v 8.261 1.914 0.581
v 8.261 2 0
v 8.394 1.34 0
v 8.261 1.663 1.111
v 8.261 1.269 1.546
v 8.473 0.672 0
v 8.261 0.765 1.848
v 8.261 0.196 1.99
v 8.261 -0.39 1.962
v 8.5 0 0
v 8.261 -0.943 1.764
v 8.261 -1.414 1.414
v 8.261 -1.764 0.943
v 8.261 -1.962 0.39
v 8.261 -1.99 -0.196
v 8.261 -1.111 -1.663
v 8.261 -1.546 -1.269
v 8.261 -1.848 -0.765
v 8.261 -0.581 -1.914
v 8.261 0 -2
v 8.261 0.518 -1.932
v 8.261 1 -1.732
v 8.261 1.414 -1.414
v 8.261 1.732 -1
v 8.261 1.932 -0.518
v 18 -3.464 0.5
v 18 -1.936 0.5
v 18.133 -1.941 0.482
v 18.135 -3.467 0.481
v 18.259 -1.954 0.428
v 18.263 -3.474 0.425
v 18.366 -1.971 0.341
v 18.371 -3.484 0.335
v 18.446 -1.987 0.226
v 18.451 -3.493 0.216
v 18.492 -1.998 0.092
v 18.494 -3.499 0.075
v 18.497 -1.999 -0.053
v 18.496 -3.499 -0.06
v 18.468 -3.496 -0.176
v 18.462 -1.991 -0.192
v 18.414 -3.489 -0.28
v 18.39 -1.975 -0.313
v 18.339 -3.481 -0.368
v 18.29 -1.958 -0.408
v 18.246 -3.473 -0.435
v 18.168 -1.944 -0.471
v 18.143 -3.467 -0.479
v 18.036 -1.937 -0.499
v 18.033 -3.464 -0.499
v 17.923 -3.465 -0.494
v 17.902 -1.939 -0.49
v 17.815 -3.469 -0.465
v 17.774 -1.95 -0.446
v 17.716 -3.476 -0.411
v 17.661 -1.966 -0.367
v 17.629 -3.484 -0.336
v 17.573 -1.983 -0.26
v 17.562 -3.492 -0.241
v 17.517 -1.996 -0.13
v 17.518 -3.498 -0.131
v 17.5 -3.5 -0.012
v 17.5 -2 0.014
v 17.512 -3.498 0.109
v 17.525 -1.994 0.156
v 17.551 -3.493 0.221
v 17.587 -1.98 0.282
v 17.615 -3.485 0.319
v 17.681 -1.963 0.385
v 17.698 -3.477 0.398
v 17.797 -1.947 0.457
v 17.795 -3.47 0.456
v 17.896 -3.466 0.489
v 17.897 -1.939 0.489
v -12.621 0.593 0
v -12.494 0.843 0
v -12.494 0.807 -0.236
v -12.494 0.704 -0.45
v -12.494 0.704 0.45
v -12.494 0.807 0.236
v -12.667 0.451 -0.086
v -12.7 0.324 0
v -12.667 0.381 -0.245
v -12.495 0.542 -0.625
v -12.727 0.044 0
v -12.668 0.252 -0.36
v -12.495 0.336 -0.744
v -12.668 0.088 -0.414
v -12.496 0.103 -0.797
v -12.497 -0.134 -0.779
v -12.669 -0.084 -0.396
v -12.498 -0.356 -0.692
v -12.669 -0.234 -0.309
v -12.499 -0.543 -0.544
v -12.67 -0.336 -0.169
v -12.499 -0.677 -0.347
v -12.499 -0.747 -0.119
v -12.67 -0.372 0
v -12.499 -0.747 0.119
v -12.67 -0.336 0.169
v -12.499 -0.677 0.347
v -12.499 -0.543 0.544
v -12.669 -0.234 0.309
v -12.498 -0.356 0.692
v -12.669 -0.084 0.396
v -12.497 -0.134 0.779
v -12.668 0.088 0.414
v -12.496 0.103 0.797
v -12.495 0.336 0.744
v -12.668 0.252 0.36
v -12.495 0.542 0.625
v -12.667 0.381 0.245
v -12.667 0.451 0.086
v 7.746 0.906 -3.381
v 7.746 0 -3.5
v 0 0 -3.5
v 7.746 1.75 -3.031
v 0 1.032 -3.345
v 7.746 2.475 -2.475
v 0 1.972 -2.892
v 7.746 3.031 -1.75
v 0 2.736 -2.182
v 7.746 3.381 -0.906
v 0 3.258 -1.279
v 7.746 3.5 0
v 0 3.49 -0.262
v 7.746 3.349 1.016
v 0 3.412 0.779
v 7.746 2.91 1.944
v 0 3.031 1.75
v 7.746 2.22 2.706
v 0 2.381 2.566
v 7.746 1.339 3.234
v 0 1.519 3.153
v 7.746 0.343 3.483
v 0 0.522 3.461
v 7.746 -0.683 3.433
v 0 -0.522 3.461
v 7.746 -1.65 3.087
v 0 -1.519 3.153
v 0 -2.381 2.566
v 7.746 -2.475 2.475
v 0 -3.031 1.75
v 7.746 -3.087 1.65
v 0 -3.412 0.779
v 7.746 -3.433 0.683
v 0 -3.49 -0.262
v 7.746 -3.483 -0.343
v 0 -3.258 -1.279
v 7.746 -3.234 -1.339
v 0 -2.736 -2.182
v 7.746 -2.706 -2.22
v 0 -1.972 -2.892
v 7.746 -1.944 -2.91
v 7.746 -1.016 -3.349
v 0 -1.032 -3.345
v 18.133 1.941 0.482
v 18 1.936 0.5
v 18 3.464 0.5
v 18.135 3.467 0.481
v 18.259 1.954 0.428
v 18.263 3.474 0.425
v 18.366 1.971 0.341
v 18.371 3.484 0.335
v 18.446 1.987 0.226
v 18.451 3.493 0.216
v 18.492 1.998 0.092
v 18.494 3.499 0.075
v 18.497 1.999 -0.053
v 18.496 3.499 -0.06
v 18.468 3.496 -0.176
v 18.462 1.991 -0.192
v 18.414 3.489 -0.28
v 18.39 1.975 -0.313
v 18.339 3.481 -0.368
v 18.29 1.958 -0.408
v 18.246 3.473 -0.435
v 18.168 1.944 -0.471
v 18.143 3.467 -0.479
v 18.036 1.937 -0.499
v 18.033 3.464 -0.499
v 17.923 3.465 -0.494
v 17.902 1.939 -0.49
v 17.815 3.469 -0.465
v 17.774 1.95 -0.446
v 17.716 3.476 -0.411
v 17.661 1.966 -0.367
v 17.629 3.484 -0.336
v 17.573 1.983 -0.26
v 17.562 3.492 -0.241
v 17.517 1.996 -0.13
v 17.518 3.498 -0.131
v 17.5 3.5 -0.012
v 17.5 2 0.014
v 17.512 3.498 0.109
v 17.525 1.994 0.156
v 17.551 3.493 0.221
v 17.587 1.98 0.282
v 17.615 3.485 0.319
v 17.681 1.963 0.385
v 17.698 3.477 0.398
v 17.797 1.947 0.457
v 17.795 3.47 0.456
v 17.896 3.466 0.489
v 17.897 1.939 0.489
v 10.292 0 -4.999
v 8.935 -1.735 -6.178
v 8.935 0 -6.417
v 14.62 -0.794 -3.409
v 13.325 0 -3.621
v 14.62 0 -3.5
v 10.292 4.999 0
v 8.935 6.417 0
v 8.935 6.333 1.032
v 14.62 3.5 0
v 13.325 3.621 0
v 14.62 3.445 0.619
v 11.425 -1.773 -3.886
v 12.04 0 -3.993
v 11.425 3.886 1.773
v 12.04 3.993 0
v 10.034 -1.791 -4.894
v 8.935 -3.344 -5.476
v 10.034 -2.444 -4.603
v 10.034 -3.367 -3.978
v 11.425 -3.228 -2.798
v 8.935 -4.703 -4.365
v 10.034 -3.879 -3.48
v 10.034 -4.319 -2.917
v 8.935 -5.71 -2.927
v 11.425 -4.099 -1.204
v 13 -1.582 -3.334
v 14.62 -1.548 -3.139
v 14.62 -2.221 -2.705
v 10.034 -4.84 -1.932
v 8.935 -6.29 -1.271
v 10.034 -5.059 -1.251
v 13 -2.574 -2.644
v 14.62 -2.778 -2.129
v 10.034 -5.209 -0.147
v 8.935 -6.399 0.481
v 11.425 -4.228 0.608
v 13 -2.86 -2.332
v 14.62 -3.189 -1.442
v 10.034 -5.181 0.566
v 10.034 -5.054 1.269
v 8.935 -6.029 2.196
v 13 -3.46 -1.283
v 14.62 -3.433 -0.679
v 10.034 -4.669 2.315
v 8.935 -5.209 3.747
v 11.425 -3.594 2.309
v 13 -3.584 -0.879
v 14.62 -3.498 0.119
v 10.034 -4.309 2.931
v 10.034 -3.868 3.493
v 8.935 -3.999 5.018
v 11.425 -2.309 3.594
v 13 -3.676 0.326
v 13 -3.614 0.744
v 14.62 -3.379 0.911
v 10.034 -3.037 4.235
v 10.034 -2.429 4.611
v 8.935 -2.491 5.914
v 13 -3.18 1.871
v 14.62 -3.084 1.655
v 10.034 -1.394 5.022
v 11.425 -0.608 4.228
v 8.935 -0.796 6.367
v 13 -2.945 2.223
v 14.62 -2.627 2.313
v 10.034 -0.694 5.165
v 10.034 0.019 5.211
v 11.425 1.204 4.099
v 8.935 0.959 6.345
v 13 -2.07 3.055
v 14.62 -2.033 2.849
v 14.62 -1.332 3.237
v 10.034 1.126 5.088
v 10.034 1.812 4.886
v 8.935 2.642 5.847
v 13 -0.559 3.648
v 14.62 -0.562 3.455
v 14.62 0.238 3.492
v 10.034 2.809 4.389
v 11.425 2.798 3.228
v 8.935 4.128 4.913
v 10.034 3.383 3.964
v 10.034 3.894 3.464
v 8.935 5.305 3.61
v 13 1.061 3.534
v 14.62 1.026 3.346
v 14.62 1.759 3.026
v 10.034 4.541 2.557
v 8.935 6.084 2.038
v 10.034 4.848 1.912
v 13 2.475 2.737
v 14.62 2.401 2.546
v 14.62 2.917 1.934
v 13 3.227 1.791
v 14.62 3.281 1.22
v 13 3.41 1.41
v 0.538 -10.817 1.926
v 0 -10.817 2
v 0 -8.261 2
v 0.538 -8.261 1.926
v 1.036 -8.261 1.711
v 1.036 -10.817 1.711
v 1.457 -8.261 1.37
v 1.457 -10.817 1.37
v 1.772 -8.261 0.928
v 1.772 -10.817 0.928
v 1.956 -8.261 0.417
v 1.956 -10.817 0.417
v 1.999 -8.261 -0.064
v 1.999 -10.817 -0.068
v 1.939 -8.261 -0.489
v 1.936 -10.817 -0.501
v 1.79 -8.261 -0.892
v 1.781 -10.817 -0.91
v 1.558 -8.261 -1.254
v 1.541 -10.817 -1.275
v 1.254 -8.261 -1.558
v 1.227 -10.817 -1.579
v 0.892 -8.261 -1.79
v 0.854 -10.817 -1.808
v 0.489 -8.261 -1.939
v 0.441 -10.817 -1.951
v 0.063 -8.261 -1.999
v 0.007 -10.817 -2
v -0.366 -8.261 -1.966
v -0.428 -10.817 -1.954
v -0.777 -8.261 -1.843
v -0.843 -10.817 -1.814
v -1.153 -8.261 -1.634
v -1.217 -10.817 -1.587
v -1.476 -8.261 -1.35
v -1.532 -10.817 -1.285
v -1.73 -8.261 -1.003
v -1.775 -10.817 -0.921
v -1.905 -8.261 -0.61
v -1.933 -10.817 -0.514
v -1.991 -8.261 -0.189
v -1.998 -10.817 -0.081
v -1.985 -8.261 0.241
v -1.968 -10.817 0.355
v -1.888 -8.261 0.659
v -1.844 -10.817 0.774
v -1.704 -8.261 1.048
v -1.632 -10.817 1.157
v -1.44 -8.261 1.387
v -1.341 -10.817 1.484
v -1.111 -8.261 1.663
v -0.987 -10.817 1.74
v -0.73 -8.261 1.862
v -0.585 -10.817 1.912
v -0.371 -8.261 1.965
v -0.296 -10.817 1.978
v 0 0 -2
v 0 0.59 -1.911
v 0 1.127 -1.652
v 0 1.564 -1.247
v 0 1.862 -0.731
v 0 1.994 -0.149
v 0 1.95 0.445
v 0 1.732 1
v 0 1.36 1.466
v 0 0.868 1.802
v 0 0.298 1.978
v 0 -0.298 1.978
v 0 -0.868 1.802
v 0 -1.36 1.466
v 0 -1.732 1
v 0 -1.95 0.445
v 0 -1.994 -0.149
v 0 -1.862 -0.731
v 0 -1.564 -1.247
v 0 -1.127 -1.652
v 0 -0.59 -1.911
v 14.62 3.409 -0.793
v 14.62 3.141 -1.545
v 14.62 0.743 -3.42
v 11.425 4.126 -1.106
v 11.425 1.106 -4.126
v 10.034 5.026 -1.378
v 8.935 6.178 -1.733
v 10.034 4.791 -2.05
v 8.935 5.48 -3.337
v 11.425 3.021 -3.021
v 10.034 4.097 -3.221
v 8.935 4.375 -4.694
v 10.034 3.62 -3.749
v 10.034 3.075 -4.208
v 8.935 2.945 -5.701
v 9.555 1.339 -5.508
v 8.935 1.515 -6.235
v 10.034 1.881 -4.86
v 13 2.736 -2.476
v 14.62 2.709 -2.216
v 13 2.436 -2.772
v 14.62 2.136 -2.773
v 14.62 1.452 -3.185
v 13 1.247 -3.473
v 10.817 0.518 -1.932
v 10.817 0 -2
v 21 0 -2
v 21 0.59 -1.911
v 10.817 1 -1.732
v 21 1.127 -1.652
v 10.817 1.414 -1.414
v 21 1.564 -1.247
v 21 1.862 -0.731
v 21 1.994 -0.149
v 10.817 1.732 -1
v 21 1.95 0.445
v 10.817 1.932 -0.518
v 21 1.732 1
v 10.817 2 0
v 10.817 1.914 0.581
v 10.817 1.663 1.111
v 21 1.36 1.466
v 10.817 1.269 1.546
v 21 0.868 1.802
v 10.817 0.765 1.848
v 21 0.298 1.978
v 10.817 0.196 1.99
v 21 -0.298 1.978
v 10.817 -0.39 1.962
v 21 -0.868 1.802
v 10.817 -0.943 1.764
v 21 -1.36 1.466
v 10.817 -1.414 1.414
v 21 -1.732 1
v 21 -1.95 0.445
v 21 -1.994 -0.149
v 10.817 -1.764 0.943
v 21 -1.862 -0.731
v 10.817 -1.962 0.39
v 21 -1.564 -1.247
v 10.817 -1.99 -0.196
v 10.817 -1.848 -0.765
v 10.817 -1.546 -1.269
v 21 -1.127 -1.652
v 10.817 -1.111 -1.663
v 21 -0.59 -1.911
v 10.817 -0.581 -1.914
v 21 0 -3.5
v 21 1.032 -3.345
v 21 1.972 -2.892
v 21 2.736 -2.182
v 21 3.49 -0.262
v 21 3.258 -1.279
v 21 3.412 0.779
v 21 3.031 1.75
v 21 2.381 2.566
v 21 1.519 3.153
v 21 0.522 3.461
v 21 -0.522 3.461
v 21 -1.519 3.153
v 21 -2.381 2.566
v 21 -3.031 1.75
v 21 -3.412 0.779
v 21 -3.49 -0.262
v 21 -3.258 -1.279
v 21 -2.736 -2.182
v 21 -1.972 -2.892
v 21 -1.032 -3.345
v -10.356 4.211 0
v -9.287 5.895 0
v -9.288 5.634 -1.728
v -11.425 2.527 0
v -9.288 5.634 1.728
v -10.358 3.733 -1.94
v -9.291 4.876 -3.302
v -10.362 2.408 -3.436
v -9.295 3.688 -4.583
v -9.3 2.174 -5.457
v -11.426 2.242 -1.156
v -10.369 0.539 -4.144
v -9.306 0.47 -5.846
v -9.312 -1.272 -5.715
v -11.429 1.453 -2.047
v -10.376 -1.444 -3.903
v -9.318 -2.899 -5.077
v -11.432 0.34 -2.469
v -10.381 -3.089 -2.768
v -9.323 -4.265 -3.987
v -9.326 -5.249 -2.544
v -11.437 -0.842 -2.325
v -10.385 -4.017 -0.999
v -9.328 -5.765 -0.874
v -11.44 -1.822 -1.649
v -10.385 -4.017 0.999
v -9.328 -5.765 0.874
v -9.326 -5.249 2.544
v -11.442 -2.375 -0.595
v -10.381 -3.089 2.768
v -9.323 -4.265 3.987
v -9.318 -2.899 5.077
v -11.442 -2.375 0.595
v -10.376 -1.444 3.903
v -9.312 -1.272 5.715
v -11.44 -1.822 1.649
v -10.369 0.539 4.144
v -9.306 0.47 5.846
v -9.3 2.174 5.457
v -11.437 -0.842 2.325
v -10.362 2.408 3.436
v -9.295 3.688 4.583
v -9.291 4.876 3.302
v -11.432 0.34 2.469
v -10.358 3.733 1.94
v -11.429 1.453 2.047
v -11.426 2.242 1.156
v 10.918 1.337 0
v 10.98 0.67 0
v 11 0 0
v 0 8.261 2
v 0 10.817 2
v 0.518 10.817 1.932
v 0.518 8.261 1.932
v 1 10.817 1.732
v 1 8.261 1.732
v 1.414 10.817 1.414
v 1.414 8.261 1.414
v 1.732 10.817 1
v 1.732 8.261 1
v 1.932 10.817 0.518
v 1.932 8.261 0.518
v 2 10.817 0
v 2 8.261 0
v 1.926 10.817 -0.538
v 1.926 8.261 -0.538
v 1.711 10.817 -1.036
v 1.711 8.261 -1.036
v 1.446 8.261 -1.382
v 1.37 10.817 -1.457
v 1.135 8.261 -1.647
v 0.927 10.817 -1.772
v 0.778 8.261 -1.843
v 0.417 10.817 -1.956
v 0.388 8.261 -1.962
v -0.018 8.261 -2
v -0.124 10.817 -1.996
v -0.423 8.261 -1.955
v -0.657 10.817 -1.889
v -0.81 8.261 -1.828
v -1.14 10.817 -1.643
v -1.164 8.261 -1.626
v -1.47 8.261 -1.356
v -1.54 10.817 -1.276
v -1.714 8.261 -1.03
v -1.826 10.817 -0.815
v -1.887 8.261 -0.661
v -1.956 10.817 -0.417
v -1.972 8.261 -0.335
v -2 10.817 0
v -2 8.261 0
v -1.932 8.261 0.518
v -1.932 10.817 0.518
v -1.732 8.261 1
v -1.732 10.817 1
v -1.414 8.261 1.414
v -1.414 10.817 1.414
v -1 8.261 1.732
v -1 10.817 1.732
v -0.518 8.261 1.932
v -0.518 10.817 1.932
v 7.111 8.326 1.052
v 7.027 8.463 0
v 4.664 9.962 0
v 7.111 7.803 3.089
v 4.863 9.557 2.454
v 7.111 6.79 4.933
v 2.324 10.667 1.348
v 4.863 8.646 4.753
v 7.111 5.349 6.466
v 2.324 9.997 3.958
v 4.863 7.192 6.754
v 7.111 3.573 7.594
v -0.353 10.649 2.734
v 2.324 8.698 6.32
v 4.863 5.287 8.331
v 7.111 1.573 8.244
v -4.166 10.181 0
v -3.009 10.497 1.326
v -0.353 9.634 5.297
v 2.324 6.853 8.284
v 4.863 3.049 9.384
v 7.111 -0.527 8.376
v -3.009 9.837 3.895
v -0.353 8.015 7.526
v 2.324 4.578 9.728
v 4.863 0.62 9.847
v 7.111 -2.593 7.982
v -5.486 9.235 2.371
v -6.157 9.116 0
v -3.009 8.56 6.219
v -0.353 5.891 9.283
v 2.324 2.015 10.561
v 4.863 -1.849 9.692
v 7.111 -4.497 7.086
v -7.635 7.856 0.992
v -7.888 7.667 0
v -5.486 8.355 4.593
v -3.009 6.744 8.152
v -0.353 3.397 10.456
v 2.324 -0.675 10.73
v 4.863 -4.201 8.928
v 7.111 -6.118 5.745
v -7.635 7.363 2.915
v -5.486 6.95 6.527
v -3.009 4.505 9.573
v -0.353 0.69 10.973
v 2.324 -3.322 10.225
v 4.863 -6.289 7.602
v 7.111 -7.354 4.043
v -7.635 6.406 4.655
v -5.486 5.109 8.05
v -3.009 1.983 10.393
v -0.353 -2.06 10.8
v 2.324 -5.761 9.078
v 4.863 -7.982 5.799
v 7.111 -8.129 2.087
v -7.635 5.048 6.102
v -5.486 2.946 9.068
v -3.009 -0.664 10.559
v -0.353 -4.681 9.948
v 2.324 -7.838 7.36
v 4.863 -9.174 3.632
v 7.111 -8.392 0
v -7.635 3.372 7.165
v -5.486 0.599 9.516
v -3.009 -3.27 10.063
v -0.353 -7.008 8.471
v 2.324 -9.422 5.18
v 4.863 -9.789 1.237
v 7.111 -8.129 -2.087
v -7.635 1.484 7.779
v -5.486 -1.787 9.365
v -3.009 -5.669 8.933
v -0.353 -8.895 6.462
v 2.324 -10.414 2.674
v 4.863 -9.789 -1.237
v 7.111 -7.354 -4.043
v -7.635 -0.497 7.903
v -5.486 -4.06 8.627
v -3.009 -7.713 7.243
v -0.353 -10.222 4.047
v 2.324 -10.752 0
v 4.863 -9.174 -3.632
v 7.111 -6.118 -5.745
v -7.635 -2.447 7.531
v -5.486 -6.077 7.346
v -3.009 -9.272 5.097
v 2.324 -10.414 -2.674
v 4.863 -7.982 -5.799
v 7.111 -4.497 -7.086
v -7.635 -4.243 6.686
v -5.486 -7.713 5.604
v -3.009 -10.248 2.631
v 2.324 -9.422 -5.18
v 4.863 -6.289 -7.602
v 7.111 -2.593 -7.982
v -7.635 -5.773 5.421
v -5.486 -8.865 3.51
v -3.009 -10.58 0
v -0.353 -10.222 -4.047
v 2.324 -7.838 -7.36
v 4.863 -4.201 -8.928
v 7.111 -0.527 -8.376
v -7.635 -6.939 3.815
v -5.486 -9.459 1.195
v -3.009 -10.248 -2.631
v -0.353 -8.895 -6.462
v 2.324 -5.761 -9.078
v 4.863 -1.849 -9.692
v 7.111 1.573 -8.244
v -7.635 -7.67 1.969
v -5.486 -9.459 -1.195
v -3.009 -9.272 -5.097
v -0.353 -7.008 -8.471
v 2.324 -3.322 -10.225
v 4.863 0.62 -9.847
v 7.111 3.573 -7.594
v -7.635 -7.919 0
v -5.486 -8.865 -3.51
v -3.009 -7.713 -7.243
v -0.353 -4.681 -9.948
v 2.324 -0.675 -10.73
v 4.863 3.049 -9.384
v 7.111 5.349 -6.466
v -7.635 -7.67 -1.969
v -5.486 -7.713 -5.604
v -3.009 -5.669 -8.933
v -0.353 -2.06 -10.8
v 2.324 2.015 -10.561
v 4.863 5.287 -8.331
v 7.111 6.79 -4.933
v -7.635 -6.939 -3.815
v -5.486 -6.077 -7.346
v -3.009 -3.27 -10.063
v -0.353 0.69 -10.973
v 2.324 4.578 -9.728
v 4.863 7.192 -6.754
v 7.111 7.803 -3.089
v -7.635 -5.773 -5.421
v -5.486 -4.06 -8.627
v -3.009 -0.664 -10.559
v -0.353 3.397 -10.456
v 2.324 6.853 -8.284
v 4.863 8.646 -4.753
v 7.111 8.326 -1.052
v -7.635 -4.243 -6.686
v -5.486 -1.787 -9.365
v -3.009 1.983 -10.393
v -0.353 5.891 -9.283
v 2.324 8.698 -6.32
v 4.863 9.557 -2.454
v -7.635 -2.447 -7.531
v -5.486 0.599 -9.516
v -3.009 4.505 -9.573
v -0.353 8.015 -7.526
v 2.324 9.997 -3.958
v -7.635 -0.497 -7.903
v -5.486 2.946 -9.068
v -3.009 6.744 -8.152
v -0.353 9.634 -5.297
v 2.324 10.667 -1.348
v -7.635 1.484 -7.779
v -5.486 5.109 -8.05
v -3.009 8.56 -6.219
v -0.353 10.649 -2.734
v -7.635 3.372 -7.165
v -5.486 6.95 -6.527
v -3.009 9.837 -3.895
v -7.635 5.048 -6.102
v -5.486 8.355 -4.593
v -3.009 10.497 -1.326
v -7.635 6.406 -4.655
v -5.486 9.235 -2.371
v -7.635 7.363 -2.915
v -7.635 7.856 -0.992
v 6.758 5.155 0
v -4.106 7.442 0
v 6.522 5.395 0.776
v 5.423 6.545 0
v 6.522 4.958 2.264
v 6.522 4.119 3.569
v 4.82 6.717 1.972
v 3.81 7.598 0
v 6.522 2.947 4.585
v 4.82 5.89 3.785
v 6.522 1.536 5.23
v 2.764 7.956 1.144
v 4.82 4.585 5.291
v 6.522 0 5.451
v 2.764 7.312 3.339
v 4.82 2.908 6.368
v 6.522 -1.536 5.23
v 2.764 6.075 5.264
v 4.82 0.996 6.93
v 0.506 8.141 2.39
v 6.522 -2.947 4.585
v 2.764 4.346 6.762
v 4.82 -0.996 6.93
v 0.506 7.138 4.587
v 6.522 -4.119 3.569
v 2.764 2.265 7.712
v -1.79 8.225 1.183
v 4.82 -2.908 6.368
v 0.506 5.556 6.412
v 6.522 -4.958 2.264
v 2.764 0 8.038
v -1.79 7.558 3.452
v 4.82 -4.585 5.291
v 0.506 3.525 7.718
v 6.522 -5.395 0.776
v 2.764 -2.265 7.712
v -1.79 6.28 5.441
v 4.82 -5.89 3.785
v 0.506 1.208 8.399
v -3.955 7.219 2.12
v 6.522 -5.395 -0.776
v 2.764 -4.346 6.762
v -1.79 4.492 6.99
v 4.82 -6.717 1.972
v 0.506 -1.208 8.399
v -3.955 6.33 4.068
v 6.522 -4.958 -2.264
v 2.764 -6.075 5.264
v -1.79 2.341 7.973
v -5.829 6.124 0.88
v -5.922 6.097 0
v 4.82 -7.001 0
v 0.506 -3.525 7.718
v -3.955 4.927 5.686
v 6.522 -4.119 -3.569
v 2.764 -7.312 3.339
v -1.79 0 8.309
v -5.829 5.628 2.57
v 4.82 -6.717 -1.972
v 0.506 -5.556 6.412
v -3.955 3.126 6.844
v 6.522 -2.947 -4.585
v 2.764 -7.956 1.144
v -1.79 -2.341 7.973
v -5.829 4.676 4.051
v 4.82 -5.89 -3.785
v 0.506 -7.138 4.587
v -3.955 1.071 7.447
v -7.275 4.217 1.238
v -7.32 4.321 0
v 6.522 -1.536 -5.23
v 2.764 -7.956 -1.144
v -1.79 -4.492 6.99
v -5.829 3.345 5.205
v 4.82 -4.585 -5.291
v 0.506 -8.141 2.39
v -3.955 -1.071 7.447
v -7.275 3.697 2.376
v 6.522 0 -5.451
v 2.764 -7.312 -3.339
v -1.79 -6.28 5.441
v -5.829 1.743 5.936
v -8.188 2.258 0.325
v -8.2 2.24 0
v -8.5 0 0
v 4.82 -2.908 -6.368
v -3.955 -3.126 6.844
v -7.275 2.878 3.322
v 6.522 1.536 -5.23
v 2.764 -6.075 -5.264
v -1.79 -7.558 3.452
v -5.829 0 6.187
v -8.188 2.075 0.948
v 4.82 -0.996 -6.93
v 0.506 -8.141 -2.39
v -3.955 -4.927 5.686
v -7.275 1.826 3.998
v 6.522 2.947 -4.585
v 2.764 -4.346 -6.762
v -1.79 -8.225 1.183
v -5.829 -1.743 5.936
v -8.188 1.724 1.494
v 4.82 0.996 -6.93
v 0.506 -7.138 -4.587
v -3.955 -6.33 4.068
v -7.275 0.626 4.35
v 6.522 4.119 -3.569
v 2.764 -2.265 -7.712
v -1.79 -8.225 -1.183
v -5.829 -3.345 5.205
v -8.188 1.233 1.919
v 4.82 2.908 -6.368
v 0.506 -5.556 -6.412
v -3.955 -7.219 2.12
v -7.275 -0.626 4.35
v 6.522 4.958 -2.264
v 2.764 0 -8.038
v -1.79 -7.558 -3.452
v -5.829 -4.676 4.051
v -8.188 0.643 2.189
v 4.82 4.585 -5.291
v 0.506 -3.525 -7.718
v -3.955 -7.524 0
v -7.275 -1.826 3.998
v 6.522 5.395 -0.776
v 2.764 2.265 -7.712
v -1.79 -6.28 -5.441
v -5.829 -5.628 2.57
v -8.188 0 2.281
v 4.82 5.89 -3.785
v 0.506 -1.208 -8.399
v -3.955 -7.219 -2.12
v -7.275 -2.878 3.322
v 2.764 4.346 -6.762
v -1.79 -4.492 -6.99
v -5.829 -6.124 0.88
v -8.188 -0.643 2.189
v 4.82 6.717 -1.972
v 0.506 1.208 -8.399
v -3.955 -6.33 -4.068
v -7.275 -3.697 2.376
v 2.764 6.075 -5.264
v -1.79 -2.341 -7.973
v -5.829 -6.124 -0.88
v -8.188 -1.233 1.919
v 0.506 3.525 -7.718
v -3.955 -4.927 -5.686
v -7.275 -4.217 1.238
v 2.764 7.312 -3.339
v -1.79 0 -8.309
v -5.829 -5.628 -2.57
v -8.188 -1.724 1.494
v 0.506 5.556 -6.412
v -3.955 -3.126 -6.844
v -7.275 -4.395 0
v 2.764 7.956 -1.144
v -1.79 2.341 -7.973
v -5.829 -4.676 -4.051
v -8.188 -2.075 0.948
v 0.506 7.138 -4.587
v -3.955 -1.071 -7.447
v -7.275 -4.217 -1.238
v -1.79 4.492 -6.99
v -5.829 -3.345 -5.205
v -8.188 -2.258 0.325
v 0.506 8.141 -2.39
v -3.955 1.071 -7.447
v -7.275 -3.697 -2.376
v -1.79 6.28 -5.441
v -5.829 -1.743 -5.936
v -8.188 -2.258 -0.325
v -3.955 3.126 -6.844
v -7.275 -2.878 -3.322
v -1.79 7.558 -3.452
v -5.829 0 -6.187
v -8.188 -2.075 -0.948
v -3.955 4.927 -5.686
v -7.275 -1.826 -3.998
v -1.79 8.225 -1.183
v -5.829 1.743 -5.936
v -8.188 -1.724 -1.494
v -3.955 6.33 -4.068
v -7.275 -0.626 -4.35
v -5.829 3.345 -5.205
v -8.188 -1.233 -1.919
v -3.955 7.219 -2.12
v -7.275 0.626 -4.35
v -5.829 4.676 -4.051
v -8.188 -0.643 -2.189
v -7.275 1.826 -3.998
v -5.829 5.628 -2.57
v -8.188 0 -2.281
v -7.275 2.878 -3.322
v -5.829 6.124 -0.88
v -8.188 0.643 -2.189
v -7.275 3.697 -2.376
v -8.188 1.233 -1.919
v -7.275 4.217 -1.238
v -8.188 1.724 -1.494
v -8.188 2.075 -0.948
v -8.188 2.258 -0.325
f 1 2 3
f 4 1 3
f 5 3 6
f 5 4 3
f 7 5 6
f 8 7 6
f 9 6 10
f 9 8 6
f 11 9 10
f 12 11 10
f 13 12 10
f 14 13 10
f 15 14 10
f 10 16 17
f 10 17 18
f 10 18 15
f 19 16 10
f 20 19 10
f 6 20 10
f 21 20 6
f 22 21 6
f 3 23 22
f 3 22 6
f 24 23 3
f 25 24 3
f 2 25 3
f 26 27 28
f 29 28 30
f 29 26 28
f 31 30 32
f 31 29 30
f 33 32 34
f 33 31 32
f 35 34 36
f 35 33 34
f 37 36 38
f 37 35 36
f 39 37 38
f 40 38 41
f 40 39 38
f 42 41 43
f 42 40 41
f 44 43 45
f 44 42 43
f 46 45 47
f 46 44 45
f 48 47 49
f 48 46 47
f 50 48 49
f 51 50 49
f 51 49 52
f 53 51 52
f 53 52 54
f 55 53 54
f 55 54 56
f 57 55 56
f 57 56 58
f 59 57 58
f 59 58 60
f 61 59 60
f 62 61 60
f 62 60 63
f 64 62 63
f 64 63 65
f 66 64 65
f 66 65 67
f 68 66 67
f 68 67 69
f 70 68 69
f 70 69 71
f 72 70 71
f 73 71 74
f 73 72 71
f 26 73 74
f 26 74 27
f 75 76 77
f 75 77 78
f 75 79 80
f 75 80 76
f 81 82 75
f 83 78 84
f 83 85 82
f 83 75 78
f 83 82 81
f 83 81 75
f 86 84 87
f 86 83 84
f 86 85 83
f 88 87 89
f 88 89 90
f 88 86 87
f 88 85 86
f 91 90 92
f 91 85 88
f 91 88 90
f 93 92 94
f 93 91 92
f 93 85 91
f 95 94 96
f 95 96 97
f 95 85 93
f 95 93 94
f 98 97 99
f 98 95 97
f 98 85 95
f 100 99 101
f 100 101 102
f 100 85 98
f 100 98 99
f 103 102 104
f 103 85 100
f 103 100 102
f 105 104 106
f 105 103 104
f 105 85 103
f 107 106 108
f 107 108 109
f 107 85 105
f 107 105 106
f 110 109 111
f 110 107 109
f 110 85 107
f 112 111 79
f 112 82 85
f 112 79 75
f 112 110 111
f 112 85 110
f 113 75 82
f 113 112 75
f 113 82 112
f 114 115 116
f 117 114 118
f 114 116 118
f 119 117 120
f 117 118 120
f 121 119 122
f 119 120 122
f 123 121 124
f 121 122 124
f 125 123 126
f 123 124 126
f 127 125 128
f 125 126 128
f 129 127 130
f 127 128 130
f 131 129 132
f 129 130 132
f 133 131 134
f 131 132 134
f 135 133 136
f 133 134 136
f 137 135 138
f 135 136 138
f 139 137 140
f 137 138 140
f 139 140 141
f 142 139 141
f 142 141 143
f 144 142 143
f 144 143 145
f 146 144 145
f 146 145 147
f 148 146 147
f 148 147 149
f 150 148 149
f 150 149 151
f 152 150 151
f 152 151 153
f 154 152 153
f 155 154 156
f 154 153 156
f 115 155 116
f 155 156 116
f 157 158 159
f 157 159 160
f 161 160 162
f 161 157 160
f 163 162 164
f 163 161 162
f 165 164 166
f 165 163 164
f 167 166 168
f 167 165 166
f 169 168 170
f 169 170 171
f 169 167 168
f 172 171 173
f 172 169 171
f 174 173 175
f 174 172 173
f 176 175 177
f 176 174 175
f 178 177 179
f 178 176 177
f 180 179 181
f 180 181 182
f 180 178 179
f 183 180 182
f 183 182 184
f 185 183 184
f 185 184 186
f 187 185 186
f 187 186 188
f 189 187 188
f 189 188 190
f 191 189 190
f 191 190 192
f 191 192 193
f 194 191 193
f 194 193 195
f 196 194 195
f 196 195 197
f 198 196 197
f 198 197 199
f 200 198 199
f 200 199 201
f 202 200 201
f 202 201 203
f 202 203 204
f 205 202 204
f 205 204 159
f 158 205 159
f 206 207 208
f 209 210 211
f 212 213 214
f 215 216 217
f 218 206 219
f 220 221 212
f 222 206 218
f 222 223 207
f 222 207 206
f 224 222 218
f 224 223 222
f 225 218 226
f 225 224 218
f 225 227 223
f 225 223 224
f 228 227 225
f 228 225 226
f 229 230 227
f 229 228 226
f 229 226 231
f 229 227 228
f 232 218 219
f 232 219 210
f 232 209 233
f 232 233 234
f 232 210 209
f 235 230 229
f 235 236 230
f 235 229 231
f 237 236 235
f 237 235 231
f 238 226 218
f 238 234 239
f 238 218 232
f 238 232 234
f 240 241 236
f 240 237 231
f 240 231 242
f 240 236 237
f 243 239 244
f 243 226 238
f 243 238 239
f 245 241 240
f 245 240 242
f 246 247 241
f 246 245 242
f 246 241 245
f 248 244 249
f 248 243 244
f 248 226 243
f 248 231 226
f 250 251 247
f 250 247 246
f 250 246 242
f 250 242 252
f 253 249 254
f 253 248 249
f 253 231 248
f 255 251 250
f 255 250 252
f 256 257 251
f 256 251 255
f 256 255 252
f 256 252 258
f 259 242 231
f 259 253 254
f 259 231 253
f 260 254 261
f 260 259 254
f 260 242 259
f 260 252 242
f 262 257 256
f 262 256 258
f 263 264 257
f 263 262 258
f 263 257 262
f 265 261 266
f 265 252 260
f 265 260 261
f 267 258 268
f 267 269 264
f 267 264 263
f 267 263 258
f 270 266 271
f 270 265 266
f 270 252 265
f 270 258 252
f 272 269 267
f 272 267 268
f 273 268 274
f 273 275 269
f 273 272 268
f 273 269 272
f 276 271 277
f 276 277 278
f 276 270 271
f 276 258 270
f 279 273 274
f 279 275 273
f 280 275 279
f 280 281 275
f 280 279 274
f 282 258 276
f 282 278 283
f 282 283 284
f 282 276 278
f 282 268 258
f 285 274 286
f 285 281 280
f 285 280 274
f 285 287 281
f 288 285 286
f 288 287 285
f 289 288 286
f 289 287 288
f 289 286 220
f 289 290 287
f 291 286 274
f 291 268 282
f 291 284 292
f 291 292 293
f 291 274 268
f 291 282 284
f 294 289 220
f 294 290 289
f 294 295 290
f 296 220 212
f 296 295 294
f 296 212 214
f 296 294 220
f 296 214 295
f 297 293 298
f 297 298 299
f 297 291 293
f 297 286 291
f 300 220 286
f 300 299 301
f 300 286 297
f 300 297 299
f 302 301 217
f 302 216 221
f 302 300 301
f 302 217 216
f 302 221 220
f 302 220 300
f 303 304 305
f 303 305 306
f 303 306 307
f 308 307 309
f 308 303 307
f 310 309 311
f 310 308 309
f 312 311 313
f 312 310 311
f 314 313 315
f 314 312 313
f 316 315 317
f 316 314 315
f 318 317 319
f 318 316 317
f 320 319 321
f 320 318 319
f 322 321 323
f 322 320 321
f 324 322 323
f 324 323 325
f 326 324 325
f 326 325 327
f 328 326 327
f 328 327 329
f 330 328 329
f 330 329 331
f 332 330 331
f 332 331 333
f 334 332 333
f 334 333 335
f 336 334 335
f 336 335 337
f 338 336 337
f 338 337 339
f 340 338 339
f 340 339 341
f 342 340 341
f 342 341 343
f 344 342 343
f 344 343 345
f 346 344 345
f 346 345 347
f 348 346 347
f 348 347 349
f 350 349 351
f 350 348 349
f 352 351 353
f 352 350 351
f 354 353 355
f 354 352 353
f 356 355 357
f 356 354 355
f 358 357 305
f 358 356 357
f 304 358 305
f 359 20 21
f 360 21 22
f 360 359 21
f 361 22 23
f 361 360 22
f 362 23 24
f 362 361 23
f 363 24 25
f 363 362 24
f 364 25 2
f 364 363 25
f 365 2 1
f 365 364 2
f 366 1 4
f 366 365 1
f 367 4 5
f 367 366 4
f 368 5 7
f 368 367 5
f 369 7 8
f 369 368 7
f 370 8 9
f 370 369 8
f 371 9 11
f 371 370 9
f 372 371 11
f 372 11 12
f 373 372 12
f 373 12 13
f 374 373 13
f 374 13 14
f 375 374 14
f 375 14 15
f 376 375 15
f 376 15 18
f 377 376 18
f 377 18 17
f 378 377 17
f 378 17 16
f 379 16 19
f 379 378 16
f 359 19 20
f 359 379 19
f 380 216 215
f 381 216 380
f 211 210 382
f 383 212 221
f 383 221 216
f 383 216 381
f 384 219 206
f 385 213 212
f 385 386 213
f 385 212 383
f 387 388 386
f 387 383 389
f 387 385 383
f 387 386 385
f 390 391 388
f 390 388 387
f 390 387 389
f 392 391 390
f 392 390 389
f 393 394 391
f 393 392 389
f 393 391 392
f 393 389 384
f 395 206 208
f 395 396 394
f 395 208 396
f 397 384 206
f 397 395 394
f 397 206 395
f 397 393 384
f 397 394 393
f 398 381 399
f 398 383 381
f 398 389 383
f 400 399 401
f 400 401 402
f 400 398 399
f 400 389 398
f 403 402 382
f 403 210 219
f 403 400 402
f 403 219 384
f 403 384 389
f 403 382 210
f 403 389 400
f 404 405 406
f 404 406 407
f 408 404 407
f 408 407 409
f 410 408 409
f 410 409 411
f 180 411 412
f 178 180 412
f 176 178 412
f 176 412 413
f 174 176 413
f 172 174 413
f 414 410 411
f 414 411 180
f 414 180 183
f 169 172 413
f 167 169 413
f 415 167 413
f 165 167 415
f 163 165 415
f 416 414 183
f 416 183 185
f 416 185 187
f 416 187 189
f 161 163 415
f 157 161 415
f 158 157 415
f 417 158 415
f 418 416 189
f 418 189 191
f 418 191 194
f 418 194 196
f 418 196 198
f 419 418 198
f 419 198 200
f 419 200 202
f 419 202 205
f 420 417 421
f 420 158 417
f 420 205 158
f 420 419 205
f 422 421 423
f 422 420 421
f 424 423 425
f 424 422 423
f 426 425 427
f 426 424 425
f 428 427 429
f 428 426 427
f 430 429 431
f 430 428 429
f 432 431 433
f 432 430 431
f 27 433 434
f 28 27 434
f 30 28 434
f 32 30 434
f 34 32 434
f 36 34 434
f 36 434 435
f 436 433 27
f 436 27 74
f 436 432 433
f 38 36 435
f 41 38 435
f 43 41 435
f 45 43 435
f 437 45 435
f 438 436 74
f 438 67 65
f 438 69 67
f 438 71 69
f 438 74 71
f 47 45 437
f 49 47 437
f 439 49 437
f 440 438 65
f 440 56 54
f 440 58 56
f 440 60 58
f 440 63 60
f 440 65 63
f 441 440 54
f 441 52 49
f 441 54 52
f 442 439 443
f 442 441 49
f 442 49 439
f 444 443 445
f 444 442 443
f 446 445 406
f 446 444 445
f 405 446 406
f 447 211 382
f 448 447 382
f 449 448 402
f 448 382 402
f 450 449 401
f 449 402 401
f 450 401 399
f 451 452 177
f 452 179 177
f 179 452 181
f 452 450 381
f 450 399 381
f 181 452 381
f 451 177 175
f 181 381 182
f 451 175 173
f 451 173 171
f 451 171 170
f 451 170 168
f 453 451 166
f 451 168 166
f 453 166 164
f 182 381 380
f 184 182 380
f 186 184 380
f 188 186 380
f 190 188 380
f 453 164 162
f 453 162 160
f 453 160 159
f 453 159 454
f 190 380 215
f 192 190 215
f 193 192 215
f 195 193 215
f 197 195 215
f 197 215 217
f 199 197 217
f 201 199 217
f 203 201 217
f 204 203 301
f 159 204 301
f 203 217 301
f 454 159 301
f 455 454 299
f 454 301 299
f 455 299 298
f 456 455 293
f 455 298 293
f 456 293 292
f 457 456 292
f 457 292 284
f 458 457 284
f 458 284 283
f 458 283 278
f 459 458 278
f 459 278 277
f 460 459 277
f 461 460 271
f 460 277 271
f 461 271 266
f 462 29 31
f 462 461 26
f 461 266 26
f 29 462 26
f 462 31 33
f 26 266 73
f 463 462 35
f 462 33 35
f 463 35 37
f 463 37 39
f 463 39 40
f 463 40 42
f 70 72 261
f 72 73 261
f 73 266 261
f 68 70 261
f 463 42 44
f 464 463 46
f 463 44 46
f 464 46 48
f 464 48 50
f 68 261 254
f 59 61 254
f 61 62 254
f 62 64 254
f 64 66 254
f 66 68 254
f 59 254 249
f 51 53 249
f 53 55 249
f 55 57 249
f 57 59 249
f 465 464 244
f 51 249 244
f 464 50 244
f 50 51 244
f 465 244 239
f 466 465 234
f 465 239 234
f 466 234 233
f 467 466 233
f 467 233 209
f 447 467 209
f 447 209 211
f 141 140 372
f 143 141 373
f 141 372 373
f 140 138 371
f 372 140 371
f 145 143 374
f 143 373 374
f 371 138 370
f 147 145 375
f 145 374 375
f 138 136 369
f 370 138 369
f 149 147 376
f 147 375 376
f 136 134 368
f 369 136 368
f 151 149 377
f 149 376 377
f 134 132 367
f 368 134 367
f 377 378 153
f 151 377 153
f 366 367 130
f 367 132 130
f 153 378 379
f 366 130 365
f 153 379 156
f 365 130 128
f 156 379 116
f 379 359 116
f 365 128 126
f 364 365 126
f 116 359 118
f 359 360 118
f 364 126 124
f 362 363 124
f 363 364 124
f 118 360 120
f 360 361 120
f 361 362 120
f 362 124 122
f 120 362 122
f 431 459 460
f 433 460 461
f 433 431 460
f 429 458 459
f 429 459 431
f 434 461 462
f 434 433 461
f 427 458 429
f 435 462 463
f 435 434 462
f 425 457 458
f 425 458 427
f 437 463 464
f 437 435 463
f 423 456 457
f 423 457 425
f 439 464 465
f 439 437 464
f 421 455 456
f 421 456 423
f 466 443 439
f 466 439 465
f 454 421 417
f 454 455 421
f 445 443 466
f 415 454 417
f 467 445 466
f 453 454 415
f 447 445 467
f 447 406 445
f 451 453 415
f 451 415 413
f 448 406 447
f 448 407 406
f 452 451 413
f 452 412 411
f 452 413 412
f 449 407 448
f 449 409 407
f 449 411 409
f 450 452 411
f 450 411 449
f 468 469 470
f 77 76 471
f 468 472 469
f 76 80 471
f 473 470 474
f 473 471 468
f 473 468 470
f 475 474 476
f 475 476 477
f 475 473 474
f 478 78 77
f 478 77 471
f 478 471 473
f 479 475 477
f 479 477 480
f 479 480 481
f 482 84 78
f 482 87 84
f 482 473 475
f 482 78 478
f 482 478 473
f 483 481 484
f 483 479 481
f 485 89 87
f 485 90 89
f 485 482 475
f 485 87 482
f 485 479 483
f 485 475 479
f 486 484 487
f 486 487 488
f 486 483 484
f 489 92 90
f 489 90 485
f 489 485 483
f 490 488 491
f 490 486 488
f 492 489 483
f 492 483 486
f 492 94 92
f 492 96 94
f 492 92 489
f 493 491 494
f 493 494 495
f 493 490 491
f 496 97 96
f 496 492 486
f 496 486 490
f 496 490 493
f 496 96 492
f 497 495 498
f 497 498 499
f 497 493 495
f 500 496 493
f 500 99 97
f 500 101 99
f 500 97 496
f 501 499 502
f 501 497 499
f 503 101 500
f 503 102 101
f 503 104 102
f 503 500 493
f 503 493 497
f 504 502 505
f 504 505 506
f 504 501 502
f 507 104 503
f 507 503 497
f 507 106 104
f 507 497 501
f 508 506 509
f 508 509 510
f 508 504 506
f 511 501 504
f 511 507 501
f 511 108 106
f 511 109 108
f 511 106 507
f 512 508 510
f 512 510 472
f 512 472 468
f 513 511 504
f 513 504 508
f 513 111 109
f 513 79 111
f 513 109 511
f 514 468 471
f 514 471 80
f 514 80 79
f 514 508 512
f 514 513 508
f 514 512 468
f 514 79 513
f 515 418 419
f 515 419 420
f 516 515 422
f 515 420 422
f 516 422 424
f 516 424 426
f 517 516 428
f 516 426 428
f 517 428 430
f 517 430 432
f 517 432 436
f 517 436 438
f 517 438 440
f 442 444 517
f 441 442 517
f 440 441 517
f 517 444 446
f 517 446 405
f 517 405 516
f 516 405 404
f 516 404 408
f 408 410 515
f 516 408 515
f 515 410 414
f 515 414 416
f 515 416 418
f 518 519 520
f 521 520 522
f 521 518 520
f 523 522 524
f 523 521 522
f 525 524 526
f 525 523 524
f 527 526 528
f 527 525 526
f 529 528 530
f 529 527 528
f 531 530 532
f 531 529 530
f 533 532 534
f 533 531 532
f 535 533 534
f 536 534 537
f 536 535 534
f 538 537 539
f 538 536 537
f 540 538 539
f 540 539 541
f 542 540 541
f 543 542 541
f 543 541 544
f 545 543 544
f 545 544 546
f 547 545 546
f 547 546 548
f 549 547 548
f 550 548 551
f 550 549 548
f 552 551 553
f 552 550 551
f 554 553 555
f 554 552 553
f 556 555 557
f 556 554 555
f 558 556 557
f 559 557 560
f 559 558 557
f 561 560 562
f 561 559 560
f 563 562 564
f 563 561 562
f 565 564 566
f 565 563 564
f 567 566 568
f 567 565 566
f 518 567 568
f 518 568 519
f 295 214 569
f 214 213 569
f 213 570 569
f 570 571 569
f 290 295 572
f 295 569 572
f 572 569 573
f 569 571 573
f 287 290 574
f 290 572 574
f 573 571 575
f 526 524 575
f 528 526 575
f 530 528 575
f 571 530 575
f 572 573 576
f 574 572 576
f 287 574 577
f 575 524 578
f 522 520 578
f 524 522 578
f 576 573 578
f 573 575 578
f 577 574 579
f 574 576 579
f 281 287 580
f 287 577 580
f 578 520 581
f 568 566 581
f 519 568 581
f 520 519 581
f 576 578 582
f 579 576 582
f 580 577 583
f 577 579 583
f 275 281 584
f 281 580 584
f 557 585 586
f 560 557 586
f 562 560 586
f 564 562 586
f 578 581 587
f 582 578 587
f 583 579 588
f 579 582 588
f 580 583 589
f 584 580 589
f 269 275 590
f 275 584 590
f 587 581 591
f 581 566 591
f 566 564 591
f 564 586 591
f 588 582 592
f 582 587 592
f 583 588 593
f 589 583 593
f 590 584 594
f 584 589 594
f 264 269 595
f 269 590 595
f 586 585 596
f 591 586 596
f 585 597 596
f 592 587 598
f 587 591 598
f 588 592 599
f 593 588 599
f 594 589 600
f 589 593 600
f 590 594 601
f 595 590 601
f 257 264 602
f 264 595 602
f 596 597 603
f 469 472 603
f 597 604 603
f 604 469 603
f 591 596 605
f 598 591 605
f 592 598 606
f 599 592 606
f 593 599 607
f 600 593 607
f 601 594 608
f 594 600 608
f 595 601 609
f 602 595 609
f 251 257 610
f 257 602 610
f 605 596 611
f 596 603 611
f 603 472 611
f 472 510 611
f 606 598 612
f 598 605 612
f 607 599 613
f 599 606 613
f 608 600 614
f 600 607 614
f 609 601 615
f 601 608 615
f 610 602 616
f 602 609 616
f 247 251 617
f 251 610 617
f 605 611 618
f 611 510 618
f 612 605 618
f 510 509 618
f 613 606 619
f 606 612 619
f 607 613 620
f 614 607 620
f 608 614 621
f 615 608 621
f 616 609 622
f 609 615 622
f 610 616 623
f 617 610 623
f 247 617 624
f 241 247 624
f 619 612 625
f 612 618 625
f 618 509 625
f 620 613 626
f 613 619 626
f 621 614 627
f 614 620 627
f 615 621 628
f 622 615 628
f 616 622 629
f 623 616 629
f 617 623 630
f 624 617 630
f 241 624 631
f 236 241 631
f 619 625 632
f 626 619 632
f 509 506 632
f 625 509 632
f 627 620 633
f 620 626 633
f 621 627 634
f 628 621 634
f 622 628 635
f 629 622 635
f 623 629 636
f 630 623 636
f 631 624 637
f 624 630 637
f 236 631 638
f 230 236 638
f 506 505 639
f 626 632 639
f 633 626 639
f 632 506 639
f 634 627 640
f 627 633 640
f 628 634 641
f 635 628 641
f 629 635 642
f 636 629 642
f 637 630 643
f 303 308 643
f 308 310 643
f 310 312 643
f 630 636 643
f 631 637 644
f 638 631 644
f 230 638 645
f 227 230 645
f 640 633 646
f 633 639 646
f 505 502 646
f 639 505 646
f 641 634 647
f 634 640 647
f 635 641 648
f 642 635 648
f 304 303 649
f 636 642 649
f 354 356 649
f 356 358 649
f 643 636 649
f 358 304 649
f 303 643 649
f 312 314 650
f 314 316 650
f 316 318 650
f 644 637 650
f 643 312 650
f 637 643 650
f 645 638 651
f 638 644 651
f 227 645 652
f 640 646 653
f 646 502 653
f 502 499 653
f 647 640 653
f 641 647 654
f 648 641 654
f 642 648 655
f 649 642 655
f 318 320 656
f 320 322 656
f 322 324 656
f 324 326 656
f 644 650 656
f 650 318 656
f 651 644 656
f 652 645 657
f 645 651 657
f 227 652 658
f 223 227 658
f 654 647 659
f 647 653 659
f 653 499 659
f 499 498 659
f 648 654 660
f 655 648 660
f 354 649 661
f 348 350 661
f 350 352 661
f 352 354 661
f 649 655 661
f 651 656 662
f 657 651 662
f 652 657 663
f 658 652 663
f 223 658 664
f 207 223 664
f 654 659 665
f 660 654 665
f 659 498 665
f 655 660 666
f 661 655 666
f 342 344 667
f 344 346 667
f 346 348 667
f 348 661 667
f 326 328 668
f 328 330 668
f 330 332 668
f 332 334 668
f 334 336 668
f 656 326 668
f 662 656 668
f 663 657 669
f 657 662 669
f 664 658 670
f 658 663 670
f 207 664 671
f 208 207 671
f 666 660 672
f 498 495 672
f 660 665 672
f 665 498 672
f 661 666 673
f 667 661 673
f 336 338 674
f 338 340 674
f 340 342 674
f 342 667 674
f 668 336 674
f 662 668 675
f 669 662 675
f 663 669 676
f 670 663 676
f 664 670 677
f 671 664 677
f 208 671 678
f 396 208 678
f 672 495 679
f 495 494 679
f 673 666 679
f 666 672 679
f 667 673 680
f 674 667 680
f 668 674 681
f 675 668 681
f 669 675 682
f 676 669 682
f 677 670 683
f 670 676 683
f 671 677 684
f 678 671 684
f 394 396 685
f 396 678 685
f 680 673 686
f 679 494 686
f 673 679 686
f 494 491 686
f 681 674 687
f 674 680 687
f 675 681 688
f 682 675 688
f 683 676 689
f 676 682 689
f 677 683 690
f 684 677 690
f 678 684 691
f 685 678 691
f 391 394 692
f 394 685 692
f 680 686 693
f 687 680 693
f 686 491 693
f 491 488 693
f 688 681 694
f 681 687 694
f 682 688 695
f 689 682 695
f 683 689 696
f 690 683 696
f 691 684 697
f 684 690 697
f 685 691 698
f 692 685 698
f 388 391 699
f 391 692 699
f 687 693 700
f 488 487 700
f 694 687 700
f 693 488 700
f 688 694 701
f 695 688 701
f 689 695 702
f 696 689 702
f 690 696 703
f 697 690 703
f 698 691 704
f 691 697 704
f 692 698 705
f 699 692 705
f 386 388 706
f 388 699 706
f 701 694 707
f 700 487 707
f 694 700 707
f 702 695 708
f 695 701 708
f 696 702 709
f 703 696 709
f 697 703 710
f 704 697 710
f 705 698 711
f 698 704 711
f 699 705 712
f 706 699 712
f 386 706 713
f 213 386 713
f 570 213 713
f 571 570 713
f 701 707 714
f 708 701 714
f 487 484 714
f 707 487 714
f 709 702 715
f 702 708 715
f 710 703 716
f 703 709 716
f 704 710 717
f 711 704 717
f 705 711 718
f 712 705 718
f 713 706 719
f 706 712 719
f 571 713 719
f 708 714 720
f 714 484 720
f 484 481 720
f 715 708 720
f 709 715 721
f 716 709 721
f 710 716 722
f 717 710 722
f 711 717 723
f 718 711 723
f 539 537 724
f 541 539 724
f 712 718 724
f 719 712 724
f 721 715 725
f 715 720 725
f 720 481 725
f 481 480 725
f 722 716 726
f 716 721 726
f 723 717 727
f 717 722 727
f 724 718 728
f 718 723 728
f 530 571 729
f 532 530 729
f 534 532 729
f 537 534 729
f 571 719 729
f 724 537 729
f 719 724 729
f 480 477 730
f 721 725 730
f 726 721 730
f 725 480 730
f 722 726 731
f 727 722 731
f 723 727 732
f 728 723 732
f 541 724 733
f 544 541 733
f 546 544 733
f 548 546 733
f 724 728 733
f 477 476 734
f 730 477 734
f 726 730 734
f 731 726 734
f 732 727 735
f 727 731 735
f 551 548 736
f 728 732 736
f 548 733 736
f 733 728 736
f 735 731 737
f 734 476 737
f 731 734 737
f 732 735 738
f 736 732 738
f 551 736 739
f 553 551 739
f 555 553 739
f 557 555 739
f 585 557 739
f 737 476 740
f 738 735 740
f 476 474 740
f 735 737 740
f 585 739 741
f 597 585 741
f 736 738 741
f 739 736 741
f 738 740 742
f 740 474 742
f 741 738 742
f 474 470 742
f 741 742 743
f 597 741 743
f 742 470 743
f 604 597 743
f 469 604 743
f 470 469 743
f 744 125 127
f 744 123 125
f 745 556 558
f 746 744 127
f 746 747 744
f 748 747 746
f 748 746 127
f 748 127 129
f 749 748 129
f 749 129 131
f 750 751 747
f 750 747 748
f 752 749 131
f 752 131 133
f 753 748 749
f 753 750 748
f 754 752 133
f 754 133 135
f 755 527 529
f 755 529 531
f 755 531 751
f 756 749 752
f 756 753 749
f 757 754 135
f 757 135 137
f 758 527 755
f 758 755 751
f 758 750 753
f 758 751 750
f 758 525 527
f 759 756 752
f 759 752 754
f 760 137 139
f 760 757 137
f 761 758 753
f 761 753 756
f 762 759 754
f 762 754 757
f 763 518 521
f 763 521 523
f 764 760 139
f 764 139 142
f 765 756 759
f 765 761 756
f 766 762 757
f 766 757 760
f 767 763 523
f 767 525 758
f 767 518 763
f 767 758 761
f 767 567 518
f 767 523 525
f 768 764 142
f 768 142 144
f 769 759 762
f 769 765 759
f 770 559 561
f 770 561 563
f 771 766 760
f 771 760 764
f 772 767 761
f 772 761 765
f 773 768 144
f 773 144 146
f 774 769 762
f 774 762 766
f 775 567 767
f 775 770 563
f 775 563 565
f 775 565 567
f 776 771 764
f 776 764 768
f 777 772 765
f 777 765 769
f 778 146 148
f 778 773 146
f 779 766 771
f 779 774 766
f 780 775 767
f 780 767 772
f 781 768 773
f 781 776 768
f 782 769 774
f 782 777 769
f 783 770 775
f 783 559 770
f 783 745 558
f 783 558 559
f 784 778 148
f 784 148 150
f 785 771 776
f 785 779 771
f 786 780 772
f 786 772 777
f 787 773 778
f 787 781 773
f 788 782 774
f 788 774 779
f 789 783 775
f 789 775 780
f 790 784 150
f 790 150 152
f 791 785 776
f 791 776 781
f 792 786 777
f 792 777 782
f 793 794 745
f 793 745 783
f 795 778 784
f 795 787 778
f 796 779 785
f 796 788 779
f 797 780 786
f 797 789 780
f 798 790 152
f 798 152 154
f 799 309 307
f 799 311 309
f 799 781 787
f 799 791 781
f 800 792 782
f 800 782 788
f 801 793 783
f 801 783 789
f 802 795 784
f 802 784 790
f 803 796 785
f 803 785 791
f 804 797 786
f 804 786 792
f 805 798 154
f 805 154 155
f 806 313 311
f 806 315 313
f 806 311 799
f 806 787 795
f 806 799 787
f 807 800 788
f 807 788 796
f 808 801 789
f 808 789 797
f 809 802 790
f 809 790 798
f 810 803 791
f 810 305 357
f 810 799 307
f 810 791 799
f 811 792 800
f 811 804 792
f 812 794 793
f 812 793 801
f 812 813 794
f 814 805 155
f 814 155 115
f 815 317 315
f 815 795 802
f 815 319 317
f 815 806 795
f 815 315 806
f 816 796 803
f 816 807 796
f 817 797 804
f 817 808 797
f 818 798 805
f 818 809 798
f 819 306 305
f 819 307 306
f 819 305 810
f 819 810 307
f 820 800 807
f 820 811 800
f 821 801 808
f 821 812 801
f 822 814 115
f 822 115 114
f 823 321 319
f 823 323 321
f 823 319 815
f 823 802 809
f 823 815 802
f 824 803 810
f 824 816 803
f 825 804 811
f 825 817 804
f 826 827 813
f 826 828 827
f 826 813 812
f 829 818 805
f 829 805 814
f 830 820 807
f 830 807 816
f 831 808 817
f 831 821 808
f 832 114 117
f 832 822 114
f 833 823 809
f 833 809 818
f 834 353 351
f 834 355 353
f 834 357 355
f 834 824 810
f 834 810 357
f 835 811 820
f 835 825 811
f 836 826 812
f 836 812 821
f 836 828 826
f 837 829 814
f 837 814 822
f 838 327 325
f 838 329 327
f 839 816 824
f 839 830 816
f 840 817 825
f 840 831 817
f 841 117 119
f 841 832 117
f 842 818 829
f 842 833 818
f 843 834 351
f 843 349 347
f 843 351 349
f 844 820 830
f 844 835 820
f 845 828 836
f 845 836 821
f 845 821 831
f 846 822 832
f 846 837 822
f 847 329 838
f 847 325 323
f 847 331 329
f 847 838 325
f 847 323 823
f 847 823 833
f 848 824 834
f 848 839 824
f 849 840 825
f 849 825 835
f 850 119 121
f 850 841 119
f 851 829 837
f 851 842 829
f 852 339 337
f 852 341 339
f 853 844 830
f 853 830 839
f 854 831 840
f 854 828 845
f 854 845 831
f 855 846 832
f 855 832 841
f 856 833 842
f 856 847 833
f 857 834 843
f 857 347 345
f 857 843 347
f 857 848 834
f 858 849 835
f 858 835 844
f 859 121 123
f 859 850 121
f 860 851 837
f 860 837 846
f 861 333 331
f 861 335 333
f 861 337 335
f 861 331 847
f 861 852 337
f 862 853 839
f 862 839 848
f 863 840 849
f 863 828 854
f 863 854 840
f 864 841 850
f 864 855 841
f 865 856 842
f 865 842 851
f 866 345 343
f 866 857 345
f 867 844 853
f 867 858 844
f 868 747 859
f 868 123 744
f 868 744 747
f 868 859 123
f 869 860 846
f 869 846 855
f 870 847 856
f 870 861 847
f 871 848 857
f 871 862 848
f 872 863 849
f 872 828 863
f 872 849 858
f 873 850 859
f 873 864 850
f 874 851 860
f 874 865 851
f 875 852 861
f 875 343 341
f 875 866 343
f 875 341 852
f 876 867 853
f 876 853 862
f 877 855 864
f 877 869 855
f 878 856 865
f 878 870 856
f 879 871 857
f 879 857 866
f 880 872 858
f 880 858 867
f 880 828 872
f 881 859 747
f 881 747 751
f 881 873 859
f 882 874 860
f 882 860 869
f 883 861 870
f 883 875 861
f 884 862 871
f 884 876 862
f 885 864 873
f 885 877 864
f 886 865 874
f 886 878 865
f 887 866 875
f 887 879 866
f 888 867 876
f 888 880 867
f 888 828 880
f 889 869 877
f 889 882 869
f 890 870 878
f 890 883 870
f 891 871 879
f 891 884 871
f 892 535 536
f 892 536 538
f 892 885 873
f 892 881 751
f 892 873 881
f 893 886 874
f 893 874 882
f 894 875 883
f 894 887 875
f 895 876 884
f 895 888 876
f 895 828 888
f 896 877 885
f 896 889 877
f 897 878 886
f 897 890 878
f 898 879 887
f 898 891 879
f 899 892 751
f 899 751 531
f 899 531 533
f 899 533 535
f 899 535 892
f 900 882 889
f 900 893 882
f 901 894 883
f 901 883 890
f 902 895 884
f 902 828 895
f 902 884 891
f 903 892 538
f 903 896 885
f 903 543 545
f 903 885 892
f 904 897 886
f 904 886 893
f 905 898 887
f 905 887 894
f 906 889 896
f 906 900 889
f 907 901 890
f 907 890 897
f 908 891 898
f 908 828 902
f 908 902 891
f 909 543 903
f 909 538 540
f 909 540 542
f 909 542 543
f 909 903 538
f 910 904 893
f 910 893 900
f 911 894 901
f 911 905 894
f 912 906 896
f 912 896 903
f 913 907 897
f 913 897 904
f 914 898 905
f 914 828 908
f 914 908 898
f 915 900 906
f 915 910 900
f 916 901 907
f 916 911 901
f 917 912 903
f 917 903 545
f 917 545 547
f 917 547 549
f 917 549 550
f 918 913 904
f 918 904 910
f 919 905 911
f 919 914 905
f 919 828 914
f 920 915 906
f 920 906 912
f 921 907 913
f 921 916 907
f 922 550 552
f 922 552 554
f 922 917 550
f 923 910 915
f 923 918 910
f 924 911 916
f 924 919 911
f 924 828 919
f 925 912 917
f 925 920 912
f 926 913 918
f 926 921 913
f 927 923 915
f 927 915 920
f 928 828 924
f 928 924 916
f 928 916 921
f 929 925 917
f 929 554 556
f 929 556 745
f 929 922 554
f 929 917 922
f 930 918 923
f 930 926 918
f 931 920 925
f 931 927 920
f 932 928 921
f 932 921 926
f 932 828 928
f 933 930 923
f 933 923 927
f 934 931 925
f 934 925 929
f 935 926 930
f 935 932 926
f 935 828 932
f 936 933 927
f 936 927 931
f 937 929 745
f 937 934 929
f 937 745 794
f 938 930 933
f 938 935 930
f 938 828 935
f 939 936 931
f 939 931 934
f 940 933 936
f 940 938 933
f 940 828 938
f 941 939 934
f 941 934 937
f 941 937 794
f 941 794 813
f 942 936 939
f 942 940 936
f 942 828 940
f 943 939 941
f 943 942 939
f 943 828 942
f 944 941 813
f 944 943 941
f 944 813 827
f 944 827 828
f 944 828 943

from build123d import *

# Parameters (mm, degrees)
COQUE1_T                     = 2.5
ENL_V_MAT_EXTRU_1_DEPTH      = 20.052558883
ENL_V_MAT_EXTRU_1_DEPTH_BACK = 20.052558883
ESQUISSE2_R                  = 2
ESQUISSE3_R                  = 3.5
ESQUISSE3_R_2                = 2
EXTRU_MINCE1_DEPTH           = 21
CONG_1_R                     = 7
ENL_V_MAT_EXTRU_2_DEPTH      = 27.057628564
ENL_V_MAT_EXTRU_2_DEPTH_BACK = 27.057628564
ESQUISSE5_R                  = 0.5


with BuildPart() as part:
    # Esquisse1 → Révolution1 (revolve)
    with BuildSketch(Plane.XY):
        with BuildLine():
            Line((-11, 0), (11, 0))
            ThreePointArc((11, 0), (0, 11), (-11, 0))
        make_face()
    revolve(axis=Axis((-11, 0, 0), (1, 0, 0)))

    # Coque1 (no face opened: a closed hollow body)
    add(offset(amount=-COQUE1_T, mode=Mode.PRIVATE), mode=Mode.SUBTRACT)

    # Esquisse2 → Enlèv. mat.-Extru.1 (cut, two sides: drawn at the far end of the back side and taken through both)
    with BuildSketch(Plane(origin=(0, 0, 0), x_dir=(1, 0, 0), z_dir=(0, 1, 0)).offset(-ENL_V_MAT_EXTRU_1_DEPTH_BACK)):
        with Locations(Location((0, 0, 0), (0, 0, 270))):
            Circle(ESQUISSE2_R)
    extrude(amount=ENL_V_MAT_EXTRU_1_DEPTH + ENL_V_MAT_EXTRU_1_DEPTH_BACK, mode=Mode.SUBTRACT)

    # Esquisse3 → Extru.-Mince1 (add)
    with BuildSketch(Plane(origin=(0, 0, 0), x_dir=(0, 0, -1), z_dir=(1, 0, 0))):
        Circle(ESQUISSE3_R)
        Circle(ESQUISSE3_R_2, mode=Mode.SUBTRACT)
    extrude(amount=EXTRU_MINCE1_DEPTH)

    # Congé1
    cong_1_edges = [part.edges().sort_by_distance(p)[0] for p in [
        (10.428326807, -2.474873734, 2.474873734),
    ]]
    fillet(cong_1_edges, radius=CONG_1_R)

    # Esquisse4 → Révolution4 (revolve)
    with BuildSketch(Plane.XY):
        with BuildLine():
            Line((-9.287174866, 5.894775909), (-12.493705663, 0.842910886))
            ThreePointArc((-12.493705663, 0.842910886), (-12.666967343, 0.460123427), (-12.727263641, 0.044298698))
            Line((-12.727263641, 0.044298698), (-9.307579549, 0.032396096))
            Line((-9.307579549, 0.032396096), (-9.287174866, 5.894775909))
        make_face()
    revolve(axis=Axis((-9.307579549, 0.032396096, 0), (-0.9999939427166084, 0.00348059335354882, 0)))

    # Esquisse5 → Enlèv. mat.-Extru.2 (cut, two sides: drawn at the far end of the back side and taken through both)
    with BuildSketch(Plane(origin=(0, 0, 0), x_dir=(1, 0, 0), z_dir=(0, 1, 0)).offset(-ENL_V_MAT_EXTRU_2_DEPTH_BACK)):
        with Locations(Location((18, 0, 0), (0, 0, 270))):
            Circle(ESQUISSE5_R)
    extrude(amount=ENL_V_MAT_EXTRU_2_DEPTH + ENL_V_MAT_EXTRU_2_DEPTH_BACK, mode=Mode.SUBTRACT)


solid = part.part
